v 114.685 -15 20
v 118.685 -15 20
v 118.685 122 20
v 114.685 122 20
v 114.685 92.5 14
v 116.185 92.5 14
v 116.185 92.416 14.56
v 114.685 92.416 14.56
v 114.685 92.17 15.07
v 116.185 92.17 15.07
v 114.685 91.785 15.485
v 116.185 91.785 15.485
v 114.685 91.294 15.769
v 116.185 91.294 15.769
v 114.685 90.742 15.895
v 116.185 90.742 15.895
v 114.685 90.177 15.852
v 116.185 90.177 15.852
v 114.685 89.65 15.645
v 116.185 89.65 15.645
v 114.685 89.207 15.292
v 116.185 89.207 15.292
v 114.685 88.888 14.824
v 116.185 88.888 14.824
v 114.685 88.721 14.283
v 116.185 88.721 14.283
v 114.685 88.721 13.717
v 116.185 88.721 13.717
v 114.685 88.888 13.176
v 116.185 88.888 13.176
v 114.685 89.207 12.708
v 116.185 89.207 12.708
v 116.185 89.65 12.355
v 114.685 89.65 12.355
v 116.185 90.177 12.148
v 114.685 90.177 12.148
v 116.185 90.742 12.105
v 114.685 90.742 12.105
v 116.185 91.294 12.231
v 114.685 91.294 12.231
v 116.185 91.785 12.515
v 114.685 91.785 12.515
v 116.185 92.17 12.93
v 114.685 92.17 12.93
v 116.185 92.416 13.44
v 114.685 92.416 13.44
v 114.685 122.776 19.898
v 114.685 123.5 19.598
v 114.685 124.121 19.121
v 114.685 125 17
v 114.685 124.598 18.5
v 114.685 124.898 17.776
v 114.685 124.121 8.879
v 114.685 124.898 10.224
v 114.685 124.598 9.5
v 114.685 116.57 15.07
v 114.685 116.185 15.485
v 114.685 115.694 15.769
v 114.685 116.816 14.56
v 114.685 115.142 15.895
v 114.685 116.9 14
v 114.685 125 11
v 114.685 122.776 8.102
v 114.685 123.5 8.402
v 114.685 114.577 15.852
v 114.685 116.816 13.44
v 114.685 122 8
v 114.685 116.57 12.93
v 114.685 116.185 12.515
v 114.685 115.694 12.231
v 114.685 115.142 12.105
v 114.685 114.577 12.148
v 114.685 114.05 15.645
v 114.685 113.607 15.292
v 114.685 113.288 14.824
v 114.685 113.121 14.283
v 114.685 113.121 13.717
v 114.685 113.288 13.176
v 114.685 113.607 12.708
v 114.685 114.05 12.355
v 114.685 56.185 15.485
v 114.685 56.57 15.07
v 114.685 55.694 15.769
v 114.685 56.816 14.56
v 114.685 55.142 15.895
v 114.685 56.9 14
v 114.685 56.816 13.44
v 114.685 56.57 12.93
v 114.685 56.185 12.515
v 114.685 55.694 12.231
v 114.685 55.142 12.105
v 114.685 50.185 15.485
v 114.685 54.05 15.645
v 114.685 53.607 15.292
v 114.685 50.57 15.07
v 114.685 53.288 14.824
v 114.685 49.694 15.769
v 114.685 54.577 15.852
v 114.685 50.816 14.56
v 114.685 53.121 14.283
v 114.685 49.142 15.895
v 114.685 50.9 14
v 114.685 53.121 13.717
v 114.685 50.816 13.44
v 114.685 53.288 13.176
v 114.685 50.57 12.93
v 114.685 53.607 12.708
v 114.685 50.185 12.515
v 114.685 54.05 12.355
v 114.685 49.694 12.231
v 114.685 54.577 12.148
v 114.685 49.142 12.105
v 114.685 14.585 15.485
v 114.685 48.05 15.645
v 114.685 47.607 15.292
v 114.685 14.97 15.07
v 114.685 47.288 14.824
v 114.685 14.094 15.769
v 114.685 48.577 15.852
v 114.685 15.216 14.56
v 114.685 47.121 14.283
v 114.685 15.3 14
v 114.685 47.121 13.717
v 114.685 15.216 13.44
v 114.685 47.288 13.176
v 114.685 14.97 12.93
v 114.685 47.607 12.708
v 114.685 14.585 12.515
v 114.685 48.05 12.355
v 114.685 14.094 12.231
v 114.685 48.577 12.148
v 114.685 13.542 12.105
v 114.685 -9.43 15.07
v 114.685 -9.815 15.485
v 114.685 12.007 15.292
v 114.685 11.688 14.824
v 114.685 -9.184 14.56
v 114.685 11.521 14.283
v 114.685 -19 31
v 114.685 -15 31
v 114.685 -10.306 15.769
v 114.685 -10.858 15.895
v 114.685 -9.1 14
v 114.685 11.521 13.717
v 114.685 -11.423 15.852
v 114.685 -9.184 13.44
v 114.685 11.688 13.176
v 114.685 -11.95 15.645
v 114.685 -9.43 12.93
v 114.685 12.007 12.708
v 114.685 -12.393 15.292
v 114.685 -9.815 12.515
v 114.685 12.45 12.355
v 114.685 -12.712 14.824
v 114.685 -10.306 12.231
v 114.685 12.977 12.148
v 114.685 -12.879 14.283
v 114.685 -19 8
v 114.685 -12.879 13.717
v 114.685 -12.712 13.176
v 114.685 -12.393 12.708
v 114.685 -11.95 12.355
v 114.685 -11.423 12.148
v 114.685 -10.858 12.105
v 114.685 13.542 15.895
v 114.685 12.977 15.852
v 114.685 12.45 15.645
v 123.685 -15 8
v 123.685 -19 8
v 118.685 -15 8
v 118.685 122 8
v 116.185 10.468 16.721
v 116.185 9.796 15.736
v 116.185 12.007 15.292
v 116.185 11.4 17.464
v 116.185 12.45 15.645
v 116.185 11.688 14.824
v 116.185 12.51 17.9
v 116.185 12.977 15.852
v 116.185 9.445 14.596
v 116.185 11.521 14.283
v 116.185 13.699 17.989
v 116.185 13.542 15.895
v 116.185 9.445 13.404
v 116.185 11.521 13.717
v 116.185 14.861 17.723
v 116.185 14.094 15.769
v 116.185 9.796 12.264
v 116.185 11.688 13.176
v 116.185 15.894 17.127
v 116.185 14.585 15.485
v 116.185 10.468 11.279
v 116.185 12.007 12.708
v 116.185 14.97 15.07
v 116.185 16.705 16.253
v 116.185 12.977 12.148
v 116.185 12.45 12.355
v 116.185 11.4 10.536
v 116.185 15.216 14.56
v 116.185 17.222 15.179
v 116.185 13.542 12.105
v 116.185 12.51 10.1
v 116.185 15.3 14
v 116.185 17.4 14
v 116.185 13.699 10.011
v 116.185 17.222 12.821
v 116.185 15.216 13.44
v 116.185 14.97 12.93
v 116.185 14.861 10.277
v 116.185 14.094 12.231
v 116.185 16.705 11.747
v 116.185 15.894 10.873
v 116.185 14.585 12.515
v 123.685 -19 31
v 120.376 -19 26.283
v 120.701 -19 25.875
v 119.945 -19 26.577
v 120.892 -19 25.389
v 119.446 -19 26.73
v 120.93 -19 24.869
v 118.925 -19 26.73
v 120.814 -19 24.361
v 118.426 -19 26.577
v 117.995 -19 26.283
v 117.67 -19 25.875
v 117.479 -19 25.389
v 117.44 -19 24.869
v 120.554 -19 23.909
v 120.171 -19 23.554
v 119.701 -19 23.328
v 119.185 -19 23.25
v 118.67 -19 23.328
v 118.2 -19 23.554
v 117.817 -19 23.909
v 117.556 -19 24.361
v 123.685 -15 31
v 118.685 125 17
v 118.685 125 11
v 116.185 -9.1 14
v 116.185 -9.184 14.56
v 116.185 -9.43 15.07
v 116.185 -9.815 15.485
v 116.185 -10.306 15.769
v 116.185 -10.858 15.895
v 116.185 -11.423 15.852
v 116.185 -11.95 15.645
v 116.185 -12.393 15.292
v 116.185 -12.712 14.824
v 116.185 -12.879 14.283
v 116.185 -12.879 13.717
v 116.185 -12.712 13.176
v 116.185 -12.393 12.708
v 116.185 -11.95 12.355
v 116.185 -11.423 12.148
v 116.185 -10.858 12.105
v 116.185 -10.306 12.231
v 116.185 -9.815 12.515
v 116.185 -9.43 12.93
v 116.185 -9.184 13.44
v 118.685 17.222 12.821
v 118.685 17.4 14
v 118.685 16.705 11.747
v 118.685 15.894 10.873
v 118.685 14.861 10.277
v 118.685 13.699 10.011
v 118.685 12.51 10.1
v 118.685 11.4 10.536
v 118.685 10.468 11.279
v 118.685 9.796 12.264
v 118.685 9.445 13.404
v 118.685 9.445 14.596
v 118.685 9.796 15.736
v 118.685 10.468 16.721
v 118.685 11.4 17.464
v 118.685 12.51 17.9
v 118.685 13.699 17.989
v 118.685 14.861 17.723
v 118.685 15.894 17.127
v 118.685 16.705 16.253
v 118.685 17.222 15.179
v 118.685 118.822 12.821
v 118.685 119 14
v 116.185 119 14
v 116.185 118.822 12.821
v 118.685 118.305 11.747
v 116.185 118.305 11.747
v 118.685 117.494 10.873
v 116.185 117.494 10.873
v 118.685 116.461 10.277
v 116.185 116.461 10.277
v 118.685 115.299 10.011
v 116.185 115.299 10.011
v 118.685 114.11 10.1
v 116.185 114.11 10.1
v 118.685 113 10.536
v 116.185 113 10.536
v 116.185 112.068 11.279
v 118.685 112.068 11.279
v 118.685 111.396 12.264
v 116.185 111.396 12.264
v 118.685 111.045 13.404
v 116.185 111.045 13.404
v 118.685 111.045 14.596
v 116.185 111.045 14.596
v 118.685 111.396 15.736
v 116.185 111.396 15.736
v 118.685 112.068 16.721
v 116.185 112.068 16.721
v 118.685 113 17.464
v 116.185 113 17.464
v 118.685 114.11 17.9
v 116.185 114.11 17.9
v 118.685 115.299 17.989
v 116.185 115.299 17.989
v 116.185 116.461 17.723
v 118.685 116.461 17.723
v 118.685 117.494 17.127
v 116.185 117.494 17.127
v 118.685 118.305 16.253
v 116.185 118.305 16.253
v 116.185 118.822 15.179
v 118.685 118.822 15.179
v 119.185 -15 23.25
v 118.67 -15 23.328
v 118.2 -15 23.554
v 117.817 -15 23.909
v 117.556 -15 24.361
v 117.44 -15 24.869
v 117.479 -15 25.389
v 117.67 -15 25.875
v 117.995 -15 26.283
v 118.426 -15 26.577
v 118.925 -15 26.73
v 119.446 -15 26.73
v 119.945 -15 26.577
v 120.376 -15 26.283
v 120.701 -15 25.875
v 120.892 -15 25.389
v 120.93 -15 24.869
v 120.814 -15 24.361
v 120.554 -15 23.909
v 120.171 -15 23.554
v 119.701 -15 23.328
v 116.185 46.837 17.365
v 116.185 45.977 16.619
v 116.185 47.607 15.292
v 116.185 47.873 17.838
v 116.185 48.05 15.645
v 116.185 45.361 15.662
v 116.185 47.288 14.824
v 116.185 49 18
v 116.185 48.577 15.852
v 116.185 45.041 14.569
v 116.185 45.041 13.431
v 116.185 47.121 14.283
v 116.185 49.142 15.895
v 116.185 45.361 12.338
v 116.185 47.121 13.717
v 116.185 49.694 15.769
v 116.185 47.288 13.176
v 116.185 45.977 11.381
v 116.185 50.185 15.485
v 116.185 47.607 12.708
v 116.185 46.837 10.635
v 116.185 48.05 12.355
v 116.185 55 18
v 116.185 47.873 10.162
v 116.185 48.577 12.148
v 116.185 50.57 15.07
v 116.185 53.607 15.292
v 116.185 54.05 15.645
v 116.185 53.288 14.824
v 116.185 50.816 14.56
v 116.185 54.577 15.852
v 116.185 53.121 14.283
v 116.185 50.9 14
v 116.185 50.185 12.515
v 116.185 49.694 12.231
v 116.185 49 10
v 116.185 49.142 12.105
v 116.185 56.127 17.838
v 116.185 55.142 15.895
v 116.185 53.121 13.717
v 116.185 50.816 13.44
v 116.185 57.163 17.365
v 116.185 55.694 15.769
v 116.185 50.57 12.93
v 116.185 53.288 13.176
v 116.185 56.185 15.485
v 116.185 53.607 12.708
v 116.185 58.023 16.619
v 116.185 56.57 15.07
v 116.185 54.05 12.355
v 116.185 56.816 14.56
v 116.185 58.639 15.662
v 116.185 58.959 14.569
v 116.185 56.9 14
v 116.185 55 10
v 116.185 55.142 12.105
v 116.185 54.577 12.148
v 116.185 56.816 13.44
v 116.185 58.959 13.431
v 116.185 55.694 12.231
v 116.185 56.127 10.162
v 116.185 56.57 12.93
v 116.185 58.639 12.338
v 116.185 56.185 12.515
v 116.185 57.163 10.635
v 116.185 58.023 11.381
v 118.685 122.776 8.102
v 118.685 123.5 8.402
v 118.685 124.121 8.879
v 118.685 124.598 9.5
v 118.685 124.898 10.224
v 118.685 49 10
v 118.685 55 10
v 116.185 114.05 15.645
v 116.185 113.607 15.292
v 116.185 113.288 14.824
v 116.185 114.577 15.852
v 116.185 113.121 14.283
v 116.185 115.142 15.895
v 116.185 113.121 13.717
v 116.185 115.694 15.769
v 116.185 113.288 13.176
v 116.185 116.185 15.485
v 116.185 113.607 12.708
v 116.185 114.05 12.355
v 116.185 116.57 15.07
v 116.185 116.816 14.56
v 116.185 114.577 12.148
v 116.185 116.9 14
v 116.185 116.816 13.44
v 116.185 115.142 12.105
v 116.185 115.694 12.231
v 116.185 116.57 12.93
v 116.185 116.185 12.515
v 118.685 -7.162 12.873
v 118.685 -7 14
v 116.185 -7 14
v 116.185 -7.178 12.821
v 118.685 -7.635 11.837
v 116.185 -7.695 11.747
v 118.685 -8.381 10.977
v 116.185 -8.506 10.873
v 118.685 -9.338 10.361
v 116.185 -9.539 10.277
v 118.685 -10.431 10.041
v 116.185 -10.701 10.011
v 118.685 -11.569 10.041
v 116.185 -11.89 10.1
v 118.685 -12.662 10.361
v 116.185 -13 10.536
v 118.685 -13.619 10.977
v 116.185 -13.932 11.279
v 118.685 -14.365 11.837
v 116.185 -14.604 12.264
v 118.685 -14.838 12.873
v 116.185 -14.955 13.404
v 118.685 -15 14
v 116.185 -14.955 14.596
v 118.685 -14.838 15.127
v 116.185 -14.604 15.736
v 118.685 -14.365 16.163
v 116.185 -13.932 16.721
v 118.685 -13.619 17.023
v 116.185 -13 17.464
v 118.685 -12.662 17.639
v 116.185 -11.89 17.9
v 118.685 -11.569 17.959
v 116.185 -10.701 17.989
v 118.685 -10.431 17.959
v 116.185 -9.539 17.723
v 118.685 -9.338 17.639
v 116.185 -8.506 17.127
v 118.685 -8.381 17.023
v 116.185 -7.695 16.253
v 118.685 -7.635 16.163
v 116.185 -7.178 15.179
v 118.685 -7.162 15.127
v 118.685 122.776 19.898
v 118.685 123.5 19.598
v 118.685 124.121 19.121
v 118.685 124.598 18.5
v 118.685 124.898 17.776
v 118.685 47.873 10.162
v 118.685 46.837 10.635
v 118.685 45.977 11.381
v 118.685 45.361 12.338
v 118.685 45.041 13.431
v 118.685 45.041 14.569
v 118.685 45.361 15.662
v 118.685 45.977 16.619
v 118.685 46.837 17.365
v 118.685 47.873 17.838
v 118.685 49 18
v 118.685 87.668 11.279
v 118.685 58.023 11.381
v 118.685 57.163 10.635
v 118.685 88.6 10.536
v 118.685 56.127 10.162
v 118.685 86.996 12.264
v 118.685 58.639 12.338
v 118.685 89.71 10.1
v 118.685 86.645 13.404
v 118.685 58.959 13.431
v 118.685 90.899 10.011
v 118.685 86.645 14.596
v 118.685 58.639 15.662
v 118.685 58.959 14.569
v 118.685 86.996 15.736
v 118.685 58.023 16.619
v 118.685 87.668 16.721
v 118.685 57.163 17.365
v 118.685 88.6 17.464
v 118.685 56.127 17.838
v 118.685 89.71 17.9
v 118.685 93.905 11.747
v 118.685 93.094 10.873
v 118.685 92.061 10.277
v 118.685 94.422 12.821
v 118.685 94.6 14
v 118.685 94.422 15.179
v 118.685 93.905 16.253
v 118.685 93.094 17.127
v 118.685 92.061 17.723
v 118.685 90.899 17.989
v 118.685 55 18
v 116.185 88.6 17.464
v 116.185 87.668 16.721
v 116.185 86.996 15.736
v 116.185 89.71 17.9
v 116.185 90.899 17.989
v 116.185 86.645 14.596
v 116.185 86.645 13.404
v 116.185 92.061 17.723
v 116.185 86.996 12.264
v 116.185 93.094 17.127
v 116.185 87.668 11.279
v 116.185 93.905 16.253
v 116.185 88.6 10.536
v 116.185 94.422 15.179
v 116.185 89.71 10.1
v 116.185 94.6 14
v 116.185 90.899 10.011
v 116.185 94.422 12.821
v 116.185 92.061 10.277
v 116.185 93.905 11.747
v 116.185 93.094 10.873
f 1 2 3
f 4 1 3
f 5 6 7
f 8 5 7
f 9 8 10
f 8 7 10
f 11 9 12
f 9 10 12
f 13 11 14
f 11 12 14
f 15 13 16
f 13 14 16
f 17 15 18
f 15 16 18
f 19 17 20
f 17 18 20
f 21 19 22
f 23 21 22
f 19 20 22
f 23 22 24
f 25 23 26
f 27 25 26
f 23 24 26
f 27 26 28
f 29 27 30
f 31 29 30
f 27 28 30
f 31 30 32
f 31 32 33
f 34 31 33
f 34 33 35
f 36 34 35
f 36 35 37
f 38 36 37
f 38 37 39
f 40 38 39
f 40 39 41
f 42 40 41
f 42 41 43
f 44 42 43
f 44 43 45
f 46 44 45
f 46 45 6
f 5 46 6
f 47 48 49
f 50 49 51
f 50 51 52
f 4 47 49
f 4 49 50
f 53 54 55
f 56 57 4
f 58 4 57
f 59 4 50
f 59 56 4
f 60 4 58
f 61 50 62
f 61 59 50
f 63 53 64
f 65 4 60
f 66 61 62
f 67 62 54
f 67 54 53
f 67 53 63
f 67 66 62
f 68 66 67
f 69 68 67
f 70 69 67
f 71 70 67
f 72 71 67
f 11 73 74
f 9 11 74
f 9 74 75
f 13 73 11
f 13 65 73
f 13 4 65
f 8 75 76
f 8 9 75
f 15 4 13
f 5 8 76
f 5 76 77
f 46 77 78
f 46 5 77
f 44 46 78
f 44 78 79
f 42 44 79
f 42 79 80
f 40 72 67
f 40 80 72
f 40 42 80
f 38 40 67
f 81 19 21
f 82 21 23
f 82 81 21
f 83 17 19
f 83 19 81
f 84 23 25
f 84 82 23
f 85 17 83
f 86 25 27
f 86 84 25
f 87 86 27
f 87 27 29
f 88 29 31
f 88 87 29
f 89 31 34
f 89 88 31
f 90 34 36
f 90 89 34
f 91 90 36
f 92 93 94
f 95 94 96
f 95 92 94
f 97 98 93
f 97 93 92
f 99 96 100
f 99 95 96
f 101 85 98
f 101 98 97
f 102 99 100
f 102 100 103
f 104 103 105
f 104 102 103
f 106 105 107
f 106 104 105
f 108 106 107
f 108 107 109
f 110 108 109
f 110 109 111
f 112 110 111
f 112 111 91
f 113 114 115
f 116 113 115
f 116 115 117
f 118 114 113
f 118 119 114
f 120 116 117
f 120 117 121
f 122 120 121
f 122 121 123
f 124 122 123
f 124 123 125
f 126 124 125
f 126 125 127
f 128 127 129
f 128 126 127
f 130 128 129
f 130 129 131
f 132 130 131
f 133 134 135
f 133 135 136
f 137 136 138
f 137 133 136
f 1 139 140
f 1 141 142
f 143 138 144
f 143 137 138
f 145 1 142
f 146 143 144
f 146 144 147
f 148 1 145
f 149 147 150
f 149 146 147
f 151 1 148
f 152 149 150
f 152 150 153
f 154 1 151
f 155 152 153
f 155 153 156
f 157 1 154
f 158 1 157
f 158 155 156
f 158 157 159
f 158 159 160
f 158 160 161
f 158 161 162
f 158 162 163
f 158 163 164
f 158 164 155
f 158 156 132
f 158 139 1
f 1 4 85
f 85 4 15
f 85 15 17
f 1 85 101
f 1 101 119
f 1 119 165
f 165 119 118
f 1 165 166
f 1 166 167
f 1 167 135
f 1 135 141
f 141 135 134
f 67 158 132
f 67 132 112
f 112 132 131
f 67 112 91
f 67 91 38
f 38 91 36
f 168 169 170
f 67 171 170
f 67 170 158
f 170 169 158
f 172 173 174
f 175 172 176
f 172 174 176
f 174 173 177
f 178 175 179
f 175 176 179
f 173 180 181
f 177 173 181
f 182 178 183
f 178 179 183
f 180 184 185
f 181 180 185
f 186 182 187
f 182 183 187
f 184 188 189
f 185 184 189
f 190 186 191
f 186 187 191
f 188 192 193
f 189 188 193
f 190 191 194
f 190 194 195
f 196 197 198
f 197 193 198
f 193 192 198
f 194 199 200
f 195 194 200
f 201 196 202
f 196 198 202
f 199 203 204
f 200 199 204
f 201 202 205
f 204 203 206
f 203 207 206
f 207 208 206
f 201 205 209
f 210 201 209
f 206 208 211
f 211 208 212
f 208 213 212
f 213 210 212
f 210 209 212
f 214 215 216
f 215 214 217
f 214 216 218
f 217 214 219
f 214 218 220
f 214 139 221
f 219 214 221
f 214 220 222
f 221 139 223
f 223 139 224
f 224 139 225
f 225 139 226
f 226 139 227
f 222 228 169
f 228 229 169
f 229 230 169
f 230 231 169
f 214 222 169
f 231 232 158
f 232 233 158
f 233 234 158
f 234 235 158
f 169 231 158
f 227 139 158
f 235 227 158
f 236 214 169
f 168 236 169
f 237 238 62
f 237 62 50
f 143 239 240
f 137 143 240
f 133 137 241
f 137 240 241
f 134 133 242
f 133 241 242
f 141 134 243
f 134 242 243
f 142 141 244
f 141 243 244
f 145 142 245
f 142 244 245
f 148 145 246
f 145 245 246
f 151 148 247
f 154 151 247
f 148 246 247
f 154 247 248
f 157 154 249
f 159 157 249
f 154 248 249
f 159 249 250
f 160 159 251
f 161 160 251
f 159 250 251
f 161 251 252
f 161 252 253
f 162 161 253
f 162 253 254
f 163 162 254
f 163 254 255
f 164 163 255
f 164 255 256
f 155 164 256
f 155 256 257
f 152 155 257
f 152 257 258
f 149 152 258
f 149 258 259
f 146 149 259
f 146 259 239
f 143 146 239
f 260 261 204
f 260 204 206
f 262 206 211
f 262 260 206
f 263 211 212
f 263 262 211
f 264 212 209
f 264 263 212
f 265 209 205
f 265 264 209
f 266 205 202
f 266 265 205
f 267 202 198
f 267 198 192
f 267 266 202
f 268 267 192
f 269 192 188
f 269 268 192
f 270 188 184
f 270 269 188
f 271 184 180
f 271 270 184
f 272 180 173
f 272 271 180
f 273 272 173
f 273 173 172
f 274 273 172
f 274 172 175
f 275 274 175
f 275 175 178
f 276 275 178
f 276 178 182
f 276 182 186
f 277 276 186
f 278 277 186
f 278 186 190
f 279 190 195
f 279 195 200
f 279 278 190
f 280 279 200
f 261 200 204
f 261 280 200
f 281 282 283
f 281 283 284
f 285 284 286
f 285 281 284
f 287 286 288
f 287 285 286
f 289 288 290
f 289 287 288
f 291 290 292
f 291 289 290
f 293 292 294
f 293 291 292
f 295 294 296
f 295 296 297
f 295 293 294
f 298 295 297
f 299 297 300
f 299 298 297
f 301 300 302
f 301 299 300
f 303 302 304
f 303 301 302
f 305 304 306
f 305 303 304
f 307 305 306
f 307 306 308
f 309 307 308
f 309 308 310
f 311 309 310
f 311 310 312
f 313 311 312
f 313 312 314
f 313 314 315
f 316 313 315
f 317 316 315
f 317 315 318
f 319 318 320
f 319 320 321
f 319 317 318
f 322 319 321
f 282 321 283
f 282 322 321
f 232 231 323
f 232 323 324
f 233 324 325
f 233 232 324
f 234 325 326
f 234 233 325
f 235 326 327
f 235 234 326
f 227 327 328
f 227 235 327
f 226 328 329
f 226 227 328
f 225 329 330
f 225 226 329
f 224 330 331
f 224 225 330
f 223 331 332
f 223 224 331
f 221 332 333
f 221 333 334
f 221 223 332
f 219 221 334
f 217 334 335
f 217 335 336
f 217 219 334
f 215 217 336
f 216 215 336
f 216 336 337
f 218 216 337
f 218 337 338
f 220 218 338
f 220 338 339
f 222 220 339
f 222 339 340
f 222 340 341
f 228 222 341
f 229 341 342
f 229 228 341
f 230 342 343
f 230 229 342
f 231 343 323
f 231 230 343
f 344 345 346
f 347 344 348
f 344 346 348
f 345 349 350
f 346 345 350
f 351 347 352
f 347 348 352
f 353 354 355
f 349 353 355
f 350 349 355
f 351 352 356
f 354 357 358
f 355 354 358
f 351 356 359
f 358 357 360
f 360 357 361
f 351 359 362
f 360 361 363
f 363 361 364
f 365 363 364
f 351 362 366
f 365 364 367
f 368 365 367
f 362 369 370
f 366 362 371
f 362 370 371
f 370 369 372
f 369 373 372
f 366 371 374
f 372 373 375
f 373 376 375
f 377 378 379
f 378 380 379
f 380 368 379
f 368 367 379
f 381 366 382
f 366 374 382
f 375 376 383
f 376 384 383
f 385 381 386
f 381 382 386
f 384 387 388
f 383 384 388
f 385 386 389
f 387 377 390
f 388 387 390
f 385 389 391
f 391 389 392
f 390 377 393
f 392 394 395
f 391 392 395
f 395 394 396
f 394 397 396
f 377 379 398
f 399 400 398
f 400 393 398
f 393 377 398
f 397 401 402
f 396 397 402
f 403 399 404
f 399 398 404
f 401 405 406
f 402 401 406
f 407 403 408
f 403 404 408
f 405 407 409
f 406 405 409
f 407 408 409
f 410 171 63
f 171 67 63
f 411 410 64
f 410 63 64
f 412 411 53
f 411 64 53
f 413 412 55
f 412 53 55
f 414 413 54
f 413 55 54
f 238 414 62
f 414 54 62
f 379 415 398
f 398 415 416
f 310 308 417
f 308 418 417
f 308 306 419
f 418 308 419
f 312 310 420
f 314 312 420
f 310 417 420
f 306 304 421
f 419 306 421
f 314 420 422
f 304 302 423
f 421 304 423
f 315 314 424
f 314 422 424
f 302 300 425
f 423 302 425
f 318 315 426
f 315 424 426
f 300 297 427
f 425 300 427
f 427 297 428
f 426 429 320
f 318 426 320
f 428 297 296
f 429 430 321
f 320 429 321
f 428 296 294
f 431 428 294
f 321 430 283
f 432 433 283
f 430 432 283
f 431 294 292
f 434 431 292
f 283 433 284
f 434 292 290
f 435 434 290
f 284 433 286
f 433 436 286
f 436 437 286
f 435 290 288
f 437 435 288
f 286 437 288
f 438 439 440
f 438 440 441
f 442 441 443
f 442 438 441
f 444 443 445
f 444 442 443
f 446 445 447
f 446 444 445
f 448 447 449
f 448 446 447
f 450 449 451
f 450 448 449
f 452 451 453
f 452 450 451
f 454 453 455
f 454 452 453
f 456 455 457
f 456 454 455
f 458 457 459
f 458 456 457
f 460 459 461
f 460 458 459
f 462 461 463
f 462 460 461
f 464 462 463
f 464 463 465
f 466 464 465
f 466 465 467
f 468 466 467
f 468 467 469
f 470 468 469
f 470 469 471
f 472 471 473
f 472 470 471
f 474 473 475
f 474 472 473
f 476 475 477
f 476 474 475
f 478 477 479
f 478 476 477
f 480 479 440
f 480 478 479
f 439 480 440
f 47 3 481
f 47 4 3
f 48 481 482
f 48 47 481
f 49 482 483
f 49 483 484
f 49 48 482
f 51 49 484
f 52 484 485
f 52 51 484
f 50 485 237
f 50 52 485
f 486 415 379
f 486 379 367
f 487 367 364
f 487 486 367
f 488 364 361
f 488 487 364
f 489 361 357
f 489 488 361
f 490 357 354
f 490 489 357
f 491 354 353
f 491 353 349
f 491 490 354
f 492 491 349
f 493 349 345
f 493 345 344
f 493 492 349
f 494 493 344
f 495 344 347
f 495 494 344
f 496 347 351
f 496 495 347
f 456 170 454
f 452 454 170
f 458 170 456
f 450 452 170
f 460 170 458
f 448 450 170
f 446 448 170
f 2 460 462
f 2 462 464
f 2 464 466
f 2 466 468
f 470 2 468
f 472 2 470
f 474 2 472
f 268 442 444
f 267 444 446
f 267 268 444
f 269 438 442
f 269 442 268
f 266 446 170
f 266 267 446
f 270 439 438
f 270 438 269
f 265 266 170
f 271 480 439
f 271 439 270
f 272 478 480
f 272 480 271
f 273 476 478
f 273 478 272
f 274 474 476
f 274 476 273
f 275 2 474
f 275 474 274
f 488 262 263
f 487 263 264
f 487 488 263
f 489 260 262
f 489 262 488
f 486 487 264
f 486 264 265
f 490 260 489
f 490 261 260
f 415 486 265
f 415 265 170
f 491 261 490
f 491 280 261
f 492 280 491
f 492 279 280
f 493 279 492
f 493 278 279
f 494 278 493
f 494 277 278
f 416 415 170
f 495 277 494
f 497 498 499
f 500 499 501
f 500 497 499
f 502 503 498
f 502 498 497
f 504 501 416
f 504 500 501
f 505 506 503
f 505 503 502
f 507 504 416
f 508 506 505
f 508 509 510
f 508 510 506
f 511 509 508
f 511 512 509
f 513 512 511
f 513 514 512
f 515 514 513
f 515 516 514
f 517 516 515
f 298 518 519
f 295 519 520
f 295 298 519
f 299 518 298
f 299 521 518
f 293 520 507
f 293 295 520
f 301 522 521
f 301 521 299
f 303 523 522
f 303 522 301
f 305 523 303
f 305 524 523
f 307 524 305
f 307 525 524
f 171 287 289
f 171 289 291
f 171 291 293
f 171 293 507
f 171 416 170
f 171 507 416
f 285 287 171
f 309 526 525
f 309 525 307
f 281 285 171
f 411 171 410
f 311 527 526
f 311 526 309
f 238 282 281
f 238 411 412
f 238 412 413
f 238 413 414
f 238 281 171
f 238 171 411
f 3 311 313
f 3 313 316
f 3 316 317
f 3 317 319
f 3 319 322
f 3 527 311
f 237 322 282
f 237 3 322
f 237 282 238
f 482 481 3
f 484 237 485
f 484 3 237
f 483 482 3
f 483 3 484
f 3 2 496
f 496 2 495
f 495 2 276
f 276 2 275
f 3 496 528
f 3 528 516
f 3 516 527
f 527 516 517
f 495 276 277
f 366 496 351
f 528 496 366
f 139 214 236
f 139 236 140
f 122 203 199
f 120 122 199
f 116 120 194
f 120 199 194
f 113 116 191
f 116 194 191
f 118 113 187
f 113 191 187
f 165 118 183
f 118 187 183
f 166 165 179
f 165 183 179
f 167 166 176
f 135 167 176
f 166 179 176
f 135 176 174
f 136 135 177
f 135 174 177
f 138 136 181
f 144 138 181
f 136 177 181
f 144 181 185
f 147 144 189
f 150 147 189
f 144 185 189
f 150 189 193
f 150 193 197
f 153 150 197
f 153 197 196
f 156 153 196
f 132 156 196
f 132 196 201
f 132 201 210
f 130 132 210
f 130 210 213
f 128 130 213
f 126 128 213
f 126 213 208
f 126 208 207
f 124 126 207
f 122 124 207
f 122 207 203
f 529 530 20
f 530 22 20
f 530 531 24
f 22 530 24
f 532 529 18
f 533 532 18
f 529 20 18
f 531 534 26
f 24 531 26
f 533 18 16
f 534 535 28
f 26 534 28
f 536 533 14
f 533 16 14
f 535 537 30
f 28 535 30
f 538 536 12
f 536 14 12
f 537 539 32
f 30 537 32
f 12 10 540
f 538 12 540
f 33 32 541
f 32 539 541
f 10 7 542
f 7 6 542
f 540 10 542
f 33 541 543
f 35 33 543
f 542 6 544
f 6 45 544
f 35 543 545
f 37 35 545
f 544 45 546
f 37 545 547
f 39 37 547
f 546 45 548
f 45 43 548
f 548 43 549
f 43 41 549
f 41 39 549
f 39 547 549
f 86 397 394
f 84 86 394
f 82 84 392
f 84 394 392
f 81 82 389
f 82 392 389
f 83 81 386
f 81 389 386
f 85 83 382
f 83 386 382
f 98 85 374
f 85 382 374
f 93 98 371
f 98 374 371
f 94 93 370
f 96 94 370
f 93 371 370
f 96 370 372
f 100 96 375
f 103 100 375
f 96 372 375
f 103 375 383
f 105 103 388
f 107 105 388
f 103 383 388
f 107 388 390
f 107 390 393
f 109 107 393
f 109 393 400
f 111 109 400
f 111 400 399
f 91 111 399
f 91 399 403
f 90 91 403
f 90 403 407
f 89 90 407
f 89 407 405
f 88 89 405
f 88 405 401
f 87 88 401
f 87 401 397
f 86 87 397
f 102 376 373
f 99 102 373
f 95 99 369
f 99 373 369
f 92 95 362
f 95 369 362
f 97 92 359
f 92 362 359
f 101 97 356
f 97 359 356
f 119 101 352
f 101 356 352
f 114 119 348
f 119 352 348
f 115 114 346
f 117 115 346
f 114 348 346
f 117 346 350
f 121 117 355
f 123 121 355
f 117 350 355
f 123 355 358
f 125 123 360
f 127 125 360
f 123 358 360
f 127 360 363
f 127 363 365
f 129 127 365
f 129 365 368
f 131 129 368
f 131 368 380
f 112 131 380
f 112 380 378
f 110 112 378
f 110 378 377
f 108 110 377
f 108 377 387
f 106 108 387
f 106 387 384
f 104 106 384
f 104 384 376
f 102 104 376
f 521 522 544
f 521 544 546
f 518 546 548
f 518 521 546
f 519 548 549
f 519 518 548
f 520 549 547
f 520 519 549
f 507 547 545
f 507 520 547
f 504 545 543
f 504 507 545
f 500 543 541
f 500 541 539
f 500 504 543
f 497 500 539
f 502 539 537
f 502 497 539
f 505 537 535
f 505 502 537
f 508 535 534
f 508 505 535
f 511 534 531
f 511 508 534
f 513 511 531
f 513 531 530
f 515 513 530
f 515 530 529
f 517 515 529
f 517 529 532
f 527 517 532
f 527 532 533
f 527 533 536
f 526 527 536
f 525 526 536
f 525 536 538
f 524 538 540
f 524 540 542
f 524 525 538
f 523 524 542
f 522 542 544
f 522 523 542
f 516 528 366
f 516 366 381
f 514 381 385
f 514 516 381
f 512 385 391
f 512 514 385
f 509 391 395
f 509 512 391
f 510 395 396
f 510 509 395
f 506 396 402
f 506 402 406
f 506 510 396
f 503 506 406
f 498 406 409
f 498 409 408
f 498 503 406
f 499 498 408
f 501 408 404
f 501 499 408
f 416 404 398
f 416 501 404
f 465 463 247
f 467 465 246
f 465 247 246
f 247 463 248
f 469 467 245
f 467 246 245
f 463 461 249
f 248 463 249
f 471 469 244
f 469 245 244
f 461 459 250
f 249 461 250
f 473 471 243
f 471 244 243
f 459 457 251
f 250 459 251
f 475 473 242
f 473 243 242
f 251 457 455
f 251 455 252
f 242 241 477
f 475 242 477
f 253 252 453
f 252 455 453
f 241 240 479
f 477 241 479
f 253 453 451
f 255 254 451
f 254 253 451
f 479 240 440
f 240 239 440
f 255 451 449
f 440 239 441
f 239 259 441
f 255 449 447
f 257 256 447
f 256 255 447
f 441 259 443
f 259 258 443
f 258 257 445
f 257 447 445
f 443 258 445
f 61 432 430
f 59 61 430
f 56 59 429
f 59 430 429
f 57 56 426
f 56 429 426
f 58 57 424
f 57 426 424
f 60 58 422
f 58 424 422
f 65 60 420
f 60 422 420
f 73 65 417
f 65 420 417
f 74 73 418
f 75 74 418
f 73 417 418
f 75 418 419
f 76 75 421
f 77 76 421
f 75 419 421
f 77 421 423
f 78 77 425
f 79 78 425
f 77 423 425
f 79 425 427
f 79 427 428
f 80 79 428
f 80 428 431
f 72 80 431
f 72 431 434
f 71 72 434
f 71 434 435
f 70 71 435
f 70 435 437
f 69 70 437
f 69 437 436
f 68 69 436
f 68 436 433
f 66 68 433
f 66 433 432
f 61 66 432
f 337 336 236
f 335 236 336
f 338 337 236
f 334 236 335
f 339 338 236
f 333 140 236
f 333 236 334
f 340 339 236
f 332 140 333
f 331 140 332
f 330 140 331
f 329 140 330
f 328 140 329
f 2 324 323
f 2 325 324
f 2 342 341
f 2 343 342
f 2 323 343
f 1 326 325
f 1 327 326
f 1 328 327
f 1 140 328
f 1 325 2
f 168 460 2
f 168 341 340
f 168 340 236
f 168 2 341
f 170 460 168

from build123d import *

# Parameters (mm, degrees)
SKETCH050_W             = 144
SKETCH050_H             = 12
SKETCH050_R             = 1.9
PAD014_DEPTH            = 4
SKETCH051_R             = 4
POCKET036_DEPTH         = 2.5
FILLET012_R             = 3
SKETCH052_W             = 23
SKETCH052_H             = 9
SKETCH052_R             = 1.75
PAD015_DEPTH            = 4
BODY012_PLACEMENT_ANGLE = 270


with BuildPart() as hhdsidev2:
    # Sketch050 → Pad014 (new body)
    with BuildSketch(Plane.XZ):
        with Locations((-68, 6)):
            Rectangle(SKETCH050_W, SKETCH050_H)
        with Locations((-66, 6)):
            Circle(SKETCH050_R, mode=Mode.SUBTRACT)
        with Locations((-6, 6)):
            Circle(SKETCH050_R, mode=Mode.SUBTRACT)
        with Locations((-107.6, 6)):
            Circle(SKETCH050_R, mode=Mode.SUBTRACT)
        with Locations((-30.4, 6)):
            Circle(SKETCH050_R, mode=Mode.SUBTRACT)
        with Locations((-72, 6)):
            Circle(SKETCH050_R, mode=Mode.SUBTRACT)
        with Locations((-132, 6)):
            Circle(SKETCH050_R, mode=Mode.SUBTRACT)
    extrude(amount=PAD014_DEPTH)

    # Sketch051 (on Face11 of Pad014) → Pocket036 (cut)
    with BuildSketch(Plane(origin=(0, 0, 0), x_dir=(1, 0, 0), z_dir=(0, 1, 0))):
        with Locations((-107.6, -6)):
            Circle(SKETCH051_R)
        with Locations((-6, -6)):
            Circle(SKETCH051_R)
        with Locations((-30.4, -6)):
            Circle(SKETCH051_R)
        with Locations((-132, -6)):
            Circle(SKETCH051_R)
        with BuildLine():
            ThreePointArc((-72, -2), (-76, -6), (-72, -10))
            Line((-72, -10), (-66, -10))
            ThreePointArc((-66, -10), (-62, -6), (-66, -2))
            Line((-72, -2), (-66, -2))
        make_face()
    extrude(amount=-POCKET036_DEPTH, mode=Mode.SUBTRACT)

    # Fillet012
    fillet012_edges = [hhdsidev2.edges().sort_by_distance(p)[0] for p in [
        (4, -2, 12),
        (4, -2, 0),
    ]]
    fillet(fillet012_edges, radius=FILLET012_R)

    # Sketch052 (on Face4 of Fillet012) → Pad015 (join)
    with BuildSketch(Plane(origin=(-140, 0, 0), x_dir=(0, 0, -1), z_dir=(-1, 0, 0))):
        with Locations((-11.5, -0.5)):
            Rectangle(SKETCH052_W, SKETCH052_H)
        with Locations((-17, -0.5)):
            Circle(SKETCH052_R, mode=Mode.SUBTRACT)
    extrude(amount=-PAD015_DEPTH)


with BuildPart() as hhdsidev2_1:
    # Body012 placement: moved
    add(hhdsidev2.part.moved(Location((8.5, 121, 8))).rotate(Axis((8.5, 121, 8), (0, 0, -1)), BODY012_PLACEMENT_ANGLE))


with BuildPart() as hhdsidev2_mirrored:
    # Mirror001: instance of hhdSideV2
    add(hhdsidev2_1.part.mirror(Plane(origin=(3.1926938796, 78.5247560814, 0), x_dir=(0, 1, 0), z_dir=(-1, 0, 0))))


with BuildPart() as hhdsidev2_mirrored_1:
    # Mirror001 placement: moved
    add(hhdsidev2_mirrored.part.moved(Location((120.8, 0, 0))))


solid = hhdsidev2_mirrored_1.part
